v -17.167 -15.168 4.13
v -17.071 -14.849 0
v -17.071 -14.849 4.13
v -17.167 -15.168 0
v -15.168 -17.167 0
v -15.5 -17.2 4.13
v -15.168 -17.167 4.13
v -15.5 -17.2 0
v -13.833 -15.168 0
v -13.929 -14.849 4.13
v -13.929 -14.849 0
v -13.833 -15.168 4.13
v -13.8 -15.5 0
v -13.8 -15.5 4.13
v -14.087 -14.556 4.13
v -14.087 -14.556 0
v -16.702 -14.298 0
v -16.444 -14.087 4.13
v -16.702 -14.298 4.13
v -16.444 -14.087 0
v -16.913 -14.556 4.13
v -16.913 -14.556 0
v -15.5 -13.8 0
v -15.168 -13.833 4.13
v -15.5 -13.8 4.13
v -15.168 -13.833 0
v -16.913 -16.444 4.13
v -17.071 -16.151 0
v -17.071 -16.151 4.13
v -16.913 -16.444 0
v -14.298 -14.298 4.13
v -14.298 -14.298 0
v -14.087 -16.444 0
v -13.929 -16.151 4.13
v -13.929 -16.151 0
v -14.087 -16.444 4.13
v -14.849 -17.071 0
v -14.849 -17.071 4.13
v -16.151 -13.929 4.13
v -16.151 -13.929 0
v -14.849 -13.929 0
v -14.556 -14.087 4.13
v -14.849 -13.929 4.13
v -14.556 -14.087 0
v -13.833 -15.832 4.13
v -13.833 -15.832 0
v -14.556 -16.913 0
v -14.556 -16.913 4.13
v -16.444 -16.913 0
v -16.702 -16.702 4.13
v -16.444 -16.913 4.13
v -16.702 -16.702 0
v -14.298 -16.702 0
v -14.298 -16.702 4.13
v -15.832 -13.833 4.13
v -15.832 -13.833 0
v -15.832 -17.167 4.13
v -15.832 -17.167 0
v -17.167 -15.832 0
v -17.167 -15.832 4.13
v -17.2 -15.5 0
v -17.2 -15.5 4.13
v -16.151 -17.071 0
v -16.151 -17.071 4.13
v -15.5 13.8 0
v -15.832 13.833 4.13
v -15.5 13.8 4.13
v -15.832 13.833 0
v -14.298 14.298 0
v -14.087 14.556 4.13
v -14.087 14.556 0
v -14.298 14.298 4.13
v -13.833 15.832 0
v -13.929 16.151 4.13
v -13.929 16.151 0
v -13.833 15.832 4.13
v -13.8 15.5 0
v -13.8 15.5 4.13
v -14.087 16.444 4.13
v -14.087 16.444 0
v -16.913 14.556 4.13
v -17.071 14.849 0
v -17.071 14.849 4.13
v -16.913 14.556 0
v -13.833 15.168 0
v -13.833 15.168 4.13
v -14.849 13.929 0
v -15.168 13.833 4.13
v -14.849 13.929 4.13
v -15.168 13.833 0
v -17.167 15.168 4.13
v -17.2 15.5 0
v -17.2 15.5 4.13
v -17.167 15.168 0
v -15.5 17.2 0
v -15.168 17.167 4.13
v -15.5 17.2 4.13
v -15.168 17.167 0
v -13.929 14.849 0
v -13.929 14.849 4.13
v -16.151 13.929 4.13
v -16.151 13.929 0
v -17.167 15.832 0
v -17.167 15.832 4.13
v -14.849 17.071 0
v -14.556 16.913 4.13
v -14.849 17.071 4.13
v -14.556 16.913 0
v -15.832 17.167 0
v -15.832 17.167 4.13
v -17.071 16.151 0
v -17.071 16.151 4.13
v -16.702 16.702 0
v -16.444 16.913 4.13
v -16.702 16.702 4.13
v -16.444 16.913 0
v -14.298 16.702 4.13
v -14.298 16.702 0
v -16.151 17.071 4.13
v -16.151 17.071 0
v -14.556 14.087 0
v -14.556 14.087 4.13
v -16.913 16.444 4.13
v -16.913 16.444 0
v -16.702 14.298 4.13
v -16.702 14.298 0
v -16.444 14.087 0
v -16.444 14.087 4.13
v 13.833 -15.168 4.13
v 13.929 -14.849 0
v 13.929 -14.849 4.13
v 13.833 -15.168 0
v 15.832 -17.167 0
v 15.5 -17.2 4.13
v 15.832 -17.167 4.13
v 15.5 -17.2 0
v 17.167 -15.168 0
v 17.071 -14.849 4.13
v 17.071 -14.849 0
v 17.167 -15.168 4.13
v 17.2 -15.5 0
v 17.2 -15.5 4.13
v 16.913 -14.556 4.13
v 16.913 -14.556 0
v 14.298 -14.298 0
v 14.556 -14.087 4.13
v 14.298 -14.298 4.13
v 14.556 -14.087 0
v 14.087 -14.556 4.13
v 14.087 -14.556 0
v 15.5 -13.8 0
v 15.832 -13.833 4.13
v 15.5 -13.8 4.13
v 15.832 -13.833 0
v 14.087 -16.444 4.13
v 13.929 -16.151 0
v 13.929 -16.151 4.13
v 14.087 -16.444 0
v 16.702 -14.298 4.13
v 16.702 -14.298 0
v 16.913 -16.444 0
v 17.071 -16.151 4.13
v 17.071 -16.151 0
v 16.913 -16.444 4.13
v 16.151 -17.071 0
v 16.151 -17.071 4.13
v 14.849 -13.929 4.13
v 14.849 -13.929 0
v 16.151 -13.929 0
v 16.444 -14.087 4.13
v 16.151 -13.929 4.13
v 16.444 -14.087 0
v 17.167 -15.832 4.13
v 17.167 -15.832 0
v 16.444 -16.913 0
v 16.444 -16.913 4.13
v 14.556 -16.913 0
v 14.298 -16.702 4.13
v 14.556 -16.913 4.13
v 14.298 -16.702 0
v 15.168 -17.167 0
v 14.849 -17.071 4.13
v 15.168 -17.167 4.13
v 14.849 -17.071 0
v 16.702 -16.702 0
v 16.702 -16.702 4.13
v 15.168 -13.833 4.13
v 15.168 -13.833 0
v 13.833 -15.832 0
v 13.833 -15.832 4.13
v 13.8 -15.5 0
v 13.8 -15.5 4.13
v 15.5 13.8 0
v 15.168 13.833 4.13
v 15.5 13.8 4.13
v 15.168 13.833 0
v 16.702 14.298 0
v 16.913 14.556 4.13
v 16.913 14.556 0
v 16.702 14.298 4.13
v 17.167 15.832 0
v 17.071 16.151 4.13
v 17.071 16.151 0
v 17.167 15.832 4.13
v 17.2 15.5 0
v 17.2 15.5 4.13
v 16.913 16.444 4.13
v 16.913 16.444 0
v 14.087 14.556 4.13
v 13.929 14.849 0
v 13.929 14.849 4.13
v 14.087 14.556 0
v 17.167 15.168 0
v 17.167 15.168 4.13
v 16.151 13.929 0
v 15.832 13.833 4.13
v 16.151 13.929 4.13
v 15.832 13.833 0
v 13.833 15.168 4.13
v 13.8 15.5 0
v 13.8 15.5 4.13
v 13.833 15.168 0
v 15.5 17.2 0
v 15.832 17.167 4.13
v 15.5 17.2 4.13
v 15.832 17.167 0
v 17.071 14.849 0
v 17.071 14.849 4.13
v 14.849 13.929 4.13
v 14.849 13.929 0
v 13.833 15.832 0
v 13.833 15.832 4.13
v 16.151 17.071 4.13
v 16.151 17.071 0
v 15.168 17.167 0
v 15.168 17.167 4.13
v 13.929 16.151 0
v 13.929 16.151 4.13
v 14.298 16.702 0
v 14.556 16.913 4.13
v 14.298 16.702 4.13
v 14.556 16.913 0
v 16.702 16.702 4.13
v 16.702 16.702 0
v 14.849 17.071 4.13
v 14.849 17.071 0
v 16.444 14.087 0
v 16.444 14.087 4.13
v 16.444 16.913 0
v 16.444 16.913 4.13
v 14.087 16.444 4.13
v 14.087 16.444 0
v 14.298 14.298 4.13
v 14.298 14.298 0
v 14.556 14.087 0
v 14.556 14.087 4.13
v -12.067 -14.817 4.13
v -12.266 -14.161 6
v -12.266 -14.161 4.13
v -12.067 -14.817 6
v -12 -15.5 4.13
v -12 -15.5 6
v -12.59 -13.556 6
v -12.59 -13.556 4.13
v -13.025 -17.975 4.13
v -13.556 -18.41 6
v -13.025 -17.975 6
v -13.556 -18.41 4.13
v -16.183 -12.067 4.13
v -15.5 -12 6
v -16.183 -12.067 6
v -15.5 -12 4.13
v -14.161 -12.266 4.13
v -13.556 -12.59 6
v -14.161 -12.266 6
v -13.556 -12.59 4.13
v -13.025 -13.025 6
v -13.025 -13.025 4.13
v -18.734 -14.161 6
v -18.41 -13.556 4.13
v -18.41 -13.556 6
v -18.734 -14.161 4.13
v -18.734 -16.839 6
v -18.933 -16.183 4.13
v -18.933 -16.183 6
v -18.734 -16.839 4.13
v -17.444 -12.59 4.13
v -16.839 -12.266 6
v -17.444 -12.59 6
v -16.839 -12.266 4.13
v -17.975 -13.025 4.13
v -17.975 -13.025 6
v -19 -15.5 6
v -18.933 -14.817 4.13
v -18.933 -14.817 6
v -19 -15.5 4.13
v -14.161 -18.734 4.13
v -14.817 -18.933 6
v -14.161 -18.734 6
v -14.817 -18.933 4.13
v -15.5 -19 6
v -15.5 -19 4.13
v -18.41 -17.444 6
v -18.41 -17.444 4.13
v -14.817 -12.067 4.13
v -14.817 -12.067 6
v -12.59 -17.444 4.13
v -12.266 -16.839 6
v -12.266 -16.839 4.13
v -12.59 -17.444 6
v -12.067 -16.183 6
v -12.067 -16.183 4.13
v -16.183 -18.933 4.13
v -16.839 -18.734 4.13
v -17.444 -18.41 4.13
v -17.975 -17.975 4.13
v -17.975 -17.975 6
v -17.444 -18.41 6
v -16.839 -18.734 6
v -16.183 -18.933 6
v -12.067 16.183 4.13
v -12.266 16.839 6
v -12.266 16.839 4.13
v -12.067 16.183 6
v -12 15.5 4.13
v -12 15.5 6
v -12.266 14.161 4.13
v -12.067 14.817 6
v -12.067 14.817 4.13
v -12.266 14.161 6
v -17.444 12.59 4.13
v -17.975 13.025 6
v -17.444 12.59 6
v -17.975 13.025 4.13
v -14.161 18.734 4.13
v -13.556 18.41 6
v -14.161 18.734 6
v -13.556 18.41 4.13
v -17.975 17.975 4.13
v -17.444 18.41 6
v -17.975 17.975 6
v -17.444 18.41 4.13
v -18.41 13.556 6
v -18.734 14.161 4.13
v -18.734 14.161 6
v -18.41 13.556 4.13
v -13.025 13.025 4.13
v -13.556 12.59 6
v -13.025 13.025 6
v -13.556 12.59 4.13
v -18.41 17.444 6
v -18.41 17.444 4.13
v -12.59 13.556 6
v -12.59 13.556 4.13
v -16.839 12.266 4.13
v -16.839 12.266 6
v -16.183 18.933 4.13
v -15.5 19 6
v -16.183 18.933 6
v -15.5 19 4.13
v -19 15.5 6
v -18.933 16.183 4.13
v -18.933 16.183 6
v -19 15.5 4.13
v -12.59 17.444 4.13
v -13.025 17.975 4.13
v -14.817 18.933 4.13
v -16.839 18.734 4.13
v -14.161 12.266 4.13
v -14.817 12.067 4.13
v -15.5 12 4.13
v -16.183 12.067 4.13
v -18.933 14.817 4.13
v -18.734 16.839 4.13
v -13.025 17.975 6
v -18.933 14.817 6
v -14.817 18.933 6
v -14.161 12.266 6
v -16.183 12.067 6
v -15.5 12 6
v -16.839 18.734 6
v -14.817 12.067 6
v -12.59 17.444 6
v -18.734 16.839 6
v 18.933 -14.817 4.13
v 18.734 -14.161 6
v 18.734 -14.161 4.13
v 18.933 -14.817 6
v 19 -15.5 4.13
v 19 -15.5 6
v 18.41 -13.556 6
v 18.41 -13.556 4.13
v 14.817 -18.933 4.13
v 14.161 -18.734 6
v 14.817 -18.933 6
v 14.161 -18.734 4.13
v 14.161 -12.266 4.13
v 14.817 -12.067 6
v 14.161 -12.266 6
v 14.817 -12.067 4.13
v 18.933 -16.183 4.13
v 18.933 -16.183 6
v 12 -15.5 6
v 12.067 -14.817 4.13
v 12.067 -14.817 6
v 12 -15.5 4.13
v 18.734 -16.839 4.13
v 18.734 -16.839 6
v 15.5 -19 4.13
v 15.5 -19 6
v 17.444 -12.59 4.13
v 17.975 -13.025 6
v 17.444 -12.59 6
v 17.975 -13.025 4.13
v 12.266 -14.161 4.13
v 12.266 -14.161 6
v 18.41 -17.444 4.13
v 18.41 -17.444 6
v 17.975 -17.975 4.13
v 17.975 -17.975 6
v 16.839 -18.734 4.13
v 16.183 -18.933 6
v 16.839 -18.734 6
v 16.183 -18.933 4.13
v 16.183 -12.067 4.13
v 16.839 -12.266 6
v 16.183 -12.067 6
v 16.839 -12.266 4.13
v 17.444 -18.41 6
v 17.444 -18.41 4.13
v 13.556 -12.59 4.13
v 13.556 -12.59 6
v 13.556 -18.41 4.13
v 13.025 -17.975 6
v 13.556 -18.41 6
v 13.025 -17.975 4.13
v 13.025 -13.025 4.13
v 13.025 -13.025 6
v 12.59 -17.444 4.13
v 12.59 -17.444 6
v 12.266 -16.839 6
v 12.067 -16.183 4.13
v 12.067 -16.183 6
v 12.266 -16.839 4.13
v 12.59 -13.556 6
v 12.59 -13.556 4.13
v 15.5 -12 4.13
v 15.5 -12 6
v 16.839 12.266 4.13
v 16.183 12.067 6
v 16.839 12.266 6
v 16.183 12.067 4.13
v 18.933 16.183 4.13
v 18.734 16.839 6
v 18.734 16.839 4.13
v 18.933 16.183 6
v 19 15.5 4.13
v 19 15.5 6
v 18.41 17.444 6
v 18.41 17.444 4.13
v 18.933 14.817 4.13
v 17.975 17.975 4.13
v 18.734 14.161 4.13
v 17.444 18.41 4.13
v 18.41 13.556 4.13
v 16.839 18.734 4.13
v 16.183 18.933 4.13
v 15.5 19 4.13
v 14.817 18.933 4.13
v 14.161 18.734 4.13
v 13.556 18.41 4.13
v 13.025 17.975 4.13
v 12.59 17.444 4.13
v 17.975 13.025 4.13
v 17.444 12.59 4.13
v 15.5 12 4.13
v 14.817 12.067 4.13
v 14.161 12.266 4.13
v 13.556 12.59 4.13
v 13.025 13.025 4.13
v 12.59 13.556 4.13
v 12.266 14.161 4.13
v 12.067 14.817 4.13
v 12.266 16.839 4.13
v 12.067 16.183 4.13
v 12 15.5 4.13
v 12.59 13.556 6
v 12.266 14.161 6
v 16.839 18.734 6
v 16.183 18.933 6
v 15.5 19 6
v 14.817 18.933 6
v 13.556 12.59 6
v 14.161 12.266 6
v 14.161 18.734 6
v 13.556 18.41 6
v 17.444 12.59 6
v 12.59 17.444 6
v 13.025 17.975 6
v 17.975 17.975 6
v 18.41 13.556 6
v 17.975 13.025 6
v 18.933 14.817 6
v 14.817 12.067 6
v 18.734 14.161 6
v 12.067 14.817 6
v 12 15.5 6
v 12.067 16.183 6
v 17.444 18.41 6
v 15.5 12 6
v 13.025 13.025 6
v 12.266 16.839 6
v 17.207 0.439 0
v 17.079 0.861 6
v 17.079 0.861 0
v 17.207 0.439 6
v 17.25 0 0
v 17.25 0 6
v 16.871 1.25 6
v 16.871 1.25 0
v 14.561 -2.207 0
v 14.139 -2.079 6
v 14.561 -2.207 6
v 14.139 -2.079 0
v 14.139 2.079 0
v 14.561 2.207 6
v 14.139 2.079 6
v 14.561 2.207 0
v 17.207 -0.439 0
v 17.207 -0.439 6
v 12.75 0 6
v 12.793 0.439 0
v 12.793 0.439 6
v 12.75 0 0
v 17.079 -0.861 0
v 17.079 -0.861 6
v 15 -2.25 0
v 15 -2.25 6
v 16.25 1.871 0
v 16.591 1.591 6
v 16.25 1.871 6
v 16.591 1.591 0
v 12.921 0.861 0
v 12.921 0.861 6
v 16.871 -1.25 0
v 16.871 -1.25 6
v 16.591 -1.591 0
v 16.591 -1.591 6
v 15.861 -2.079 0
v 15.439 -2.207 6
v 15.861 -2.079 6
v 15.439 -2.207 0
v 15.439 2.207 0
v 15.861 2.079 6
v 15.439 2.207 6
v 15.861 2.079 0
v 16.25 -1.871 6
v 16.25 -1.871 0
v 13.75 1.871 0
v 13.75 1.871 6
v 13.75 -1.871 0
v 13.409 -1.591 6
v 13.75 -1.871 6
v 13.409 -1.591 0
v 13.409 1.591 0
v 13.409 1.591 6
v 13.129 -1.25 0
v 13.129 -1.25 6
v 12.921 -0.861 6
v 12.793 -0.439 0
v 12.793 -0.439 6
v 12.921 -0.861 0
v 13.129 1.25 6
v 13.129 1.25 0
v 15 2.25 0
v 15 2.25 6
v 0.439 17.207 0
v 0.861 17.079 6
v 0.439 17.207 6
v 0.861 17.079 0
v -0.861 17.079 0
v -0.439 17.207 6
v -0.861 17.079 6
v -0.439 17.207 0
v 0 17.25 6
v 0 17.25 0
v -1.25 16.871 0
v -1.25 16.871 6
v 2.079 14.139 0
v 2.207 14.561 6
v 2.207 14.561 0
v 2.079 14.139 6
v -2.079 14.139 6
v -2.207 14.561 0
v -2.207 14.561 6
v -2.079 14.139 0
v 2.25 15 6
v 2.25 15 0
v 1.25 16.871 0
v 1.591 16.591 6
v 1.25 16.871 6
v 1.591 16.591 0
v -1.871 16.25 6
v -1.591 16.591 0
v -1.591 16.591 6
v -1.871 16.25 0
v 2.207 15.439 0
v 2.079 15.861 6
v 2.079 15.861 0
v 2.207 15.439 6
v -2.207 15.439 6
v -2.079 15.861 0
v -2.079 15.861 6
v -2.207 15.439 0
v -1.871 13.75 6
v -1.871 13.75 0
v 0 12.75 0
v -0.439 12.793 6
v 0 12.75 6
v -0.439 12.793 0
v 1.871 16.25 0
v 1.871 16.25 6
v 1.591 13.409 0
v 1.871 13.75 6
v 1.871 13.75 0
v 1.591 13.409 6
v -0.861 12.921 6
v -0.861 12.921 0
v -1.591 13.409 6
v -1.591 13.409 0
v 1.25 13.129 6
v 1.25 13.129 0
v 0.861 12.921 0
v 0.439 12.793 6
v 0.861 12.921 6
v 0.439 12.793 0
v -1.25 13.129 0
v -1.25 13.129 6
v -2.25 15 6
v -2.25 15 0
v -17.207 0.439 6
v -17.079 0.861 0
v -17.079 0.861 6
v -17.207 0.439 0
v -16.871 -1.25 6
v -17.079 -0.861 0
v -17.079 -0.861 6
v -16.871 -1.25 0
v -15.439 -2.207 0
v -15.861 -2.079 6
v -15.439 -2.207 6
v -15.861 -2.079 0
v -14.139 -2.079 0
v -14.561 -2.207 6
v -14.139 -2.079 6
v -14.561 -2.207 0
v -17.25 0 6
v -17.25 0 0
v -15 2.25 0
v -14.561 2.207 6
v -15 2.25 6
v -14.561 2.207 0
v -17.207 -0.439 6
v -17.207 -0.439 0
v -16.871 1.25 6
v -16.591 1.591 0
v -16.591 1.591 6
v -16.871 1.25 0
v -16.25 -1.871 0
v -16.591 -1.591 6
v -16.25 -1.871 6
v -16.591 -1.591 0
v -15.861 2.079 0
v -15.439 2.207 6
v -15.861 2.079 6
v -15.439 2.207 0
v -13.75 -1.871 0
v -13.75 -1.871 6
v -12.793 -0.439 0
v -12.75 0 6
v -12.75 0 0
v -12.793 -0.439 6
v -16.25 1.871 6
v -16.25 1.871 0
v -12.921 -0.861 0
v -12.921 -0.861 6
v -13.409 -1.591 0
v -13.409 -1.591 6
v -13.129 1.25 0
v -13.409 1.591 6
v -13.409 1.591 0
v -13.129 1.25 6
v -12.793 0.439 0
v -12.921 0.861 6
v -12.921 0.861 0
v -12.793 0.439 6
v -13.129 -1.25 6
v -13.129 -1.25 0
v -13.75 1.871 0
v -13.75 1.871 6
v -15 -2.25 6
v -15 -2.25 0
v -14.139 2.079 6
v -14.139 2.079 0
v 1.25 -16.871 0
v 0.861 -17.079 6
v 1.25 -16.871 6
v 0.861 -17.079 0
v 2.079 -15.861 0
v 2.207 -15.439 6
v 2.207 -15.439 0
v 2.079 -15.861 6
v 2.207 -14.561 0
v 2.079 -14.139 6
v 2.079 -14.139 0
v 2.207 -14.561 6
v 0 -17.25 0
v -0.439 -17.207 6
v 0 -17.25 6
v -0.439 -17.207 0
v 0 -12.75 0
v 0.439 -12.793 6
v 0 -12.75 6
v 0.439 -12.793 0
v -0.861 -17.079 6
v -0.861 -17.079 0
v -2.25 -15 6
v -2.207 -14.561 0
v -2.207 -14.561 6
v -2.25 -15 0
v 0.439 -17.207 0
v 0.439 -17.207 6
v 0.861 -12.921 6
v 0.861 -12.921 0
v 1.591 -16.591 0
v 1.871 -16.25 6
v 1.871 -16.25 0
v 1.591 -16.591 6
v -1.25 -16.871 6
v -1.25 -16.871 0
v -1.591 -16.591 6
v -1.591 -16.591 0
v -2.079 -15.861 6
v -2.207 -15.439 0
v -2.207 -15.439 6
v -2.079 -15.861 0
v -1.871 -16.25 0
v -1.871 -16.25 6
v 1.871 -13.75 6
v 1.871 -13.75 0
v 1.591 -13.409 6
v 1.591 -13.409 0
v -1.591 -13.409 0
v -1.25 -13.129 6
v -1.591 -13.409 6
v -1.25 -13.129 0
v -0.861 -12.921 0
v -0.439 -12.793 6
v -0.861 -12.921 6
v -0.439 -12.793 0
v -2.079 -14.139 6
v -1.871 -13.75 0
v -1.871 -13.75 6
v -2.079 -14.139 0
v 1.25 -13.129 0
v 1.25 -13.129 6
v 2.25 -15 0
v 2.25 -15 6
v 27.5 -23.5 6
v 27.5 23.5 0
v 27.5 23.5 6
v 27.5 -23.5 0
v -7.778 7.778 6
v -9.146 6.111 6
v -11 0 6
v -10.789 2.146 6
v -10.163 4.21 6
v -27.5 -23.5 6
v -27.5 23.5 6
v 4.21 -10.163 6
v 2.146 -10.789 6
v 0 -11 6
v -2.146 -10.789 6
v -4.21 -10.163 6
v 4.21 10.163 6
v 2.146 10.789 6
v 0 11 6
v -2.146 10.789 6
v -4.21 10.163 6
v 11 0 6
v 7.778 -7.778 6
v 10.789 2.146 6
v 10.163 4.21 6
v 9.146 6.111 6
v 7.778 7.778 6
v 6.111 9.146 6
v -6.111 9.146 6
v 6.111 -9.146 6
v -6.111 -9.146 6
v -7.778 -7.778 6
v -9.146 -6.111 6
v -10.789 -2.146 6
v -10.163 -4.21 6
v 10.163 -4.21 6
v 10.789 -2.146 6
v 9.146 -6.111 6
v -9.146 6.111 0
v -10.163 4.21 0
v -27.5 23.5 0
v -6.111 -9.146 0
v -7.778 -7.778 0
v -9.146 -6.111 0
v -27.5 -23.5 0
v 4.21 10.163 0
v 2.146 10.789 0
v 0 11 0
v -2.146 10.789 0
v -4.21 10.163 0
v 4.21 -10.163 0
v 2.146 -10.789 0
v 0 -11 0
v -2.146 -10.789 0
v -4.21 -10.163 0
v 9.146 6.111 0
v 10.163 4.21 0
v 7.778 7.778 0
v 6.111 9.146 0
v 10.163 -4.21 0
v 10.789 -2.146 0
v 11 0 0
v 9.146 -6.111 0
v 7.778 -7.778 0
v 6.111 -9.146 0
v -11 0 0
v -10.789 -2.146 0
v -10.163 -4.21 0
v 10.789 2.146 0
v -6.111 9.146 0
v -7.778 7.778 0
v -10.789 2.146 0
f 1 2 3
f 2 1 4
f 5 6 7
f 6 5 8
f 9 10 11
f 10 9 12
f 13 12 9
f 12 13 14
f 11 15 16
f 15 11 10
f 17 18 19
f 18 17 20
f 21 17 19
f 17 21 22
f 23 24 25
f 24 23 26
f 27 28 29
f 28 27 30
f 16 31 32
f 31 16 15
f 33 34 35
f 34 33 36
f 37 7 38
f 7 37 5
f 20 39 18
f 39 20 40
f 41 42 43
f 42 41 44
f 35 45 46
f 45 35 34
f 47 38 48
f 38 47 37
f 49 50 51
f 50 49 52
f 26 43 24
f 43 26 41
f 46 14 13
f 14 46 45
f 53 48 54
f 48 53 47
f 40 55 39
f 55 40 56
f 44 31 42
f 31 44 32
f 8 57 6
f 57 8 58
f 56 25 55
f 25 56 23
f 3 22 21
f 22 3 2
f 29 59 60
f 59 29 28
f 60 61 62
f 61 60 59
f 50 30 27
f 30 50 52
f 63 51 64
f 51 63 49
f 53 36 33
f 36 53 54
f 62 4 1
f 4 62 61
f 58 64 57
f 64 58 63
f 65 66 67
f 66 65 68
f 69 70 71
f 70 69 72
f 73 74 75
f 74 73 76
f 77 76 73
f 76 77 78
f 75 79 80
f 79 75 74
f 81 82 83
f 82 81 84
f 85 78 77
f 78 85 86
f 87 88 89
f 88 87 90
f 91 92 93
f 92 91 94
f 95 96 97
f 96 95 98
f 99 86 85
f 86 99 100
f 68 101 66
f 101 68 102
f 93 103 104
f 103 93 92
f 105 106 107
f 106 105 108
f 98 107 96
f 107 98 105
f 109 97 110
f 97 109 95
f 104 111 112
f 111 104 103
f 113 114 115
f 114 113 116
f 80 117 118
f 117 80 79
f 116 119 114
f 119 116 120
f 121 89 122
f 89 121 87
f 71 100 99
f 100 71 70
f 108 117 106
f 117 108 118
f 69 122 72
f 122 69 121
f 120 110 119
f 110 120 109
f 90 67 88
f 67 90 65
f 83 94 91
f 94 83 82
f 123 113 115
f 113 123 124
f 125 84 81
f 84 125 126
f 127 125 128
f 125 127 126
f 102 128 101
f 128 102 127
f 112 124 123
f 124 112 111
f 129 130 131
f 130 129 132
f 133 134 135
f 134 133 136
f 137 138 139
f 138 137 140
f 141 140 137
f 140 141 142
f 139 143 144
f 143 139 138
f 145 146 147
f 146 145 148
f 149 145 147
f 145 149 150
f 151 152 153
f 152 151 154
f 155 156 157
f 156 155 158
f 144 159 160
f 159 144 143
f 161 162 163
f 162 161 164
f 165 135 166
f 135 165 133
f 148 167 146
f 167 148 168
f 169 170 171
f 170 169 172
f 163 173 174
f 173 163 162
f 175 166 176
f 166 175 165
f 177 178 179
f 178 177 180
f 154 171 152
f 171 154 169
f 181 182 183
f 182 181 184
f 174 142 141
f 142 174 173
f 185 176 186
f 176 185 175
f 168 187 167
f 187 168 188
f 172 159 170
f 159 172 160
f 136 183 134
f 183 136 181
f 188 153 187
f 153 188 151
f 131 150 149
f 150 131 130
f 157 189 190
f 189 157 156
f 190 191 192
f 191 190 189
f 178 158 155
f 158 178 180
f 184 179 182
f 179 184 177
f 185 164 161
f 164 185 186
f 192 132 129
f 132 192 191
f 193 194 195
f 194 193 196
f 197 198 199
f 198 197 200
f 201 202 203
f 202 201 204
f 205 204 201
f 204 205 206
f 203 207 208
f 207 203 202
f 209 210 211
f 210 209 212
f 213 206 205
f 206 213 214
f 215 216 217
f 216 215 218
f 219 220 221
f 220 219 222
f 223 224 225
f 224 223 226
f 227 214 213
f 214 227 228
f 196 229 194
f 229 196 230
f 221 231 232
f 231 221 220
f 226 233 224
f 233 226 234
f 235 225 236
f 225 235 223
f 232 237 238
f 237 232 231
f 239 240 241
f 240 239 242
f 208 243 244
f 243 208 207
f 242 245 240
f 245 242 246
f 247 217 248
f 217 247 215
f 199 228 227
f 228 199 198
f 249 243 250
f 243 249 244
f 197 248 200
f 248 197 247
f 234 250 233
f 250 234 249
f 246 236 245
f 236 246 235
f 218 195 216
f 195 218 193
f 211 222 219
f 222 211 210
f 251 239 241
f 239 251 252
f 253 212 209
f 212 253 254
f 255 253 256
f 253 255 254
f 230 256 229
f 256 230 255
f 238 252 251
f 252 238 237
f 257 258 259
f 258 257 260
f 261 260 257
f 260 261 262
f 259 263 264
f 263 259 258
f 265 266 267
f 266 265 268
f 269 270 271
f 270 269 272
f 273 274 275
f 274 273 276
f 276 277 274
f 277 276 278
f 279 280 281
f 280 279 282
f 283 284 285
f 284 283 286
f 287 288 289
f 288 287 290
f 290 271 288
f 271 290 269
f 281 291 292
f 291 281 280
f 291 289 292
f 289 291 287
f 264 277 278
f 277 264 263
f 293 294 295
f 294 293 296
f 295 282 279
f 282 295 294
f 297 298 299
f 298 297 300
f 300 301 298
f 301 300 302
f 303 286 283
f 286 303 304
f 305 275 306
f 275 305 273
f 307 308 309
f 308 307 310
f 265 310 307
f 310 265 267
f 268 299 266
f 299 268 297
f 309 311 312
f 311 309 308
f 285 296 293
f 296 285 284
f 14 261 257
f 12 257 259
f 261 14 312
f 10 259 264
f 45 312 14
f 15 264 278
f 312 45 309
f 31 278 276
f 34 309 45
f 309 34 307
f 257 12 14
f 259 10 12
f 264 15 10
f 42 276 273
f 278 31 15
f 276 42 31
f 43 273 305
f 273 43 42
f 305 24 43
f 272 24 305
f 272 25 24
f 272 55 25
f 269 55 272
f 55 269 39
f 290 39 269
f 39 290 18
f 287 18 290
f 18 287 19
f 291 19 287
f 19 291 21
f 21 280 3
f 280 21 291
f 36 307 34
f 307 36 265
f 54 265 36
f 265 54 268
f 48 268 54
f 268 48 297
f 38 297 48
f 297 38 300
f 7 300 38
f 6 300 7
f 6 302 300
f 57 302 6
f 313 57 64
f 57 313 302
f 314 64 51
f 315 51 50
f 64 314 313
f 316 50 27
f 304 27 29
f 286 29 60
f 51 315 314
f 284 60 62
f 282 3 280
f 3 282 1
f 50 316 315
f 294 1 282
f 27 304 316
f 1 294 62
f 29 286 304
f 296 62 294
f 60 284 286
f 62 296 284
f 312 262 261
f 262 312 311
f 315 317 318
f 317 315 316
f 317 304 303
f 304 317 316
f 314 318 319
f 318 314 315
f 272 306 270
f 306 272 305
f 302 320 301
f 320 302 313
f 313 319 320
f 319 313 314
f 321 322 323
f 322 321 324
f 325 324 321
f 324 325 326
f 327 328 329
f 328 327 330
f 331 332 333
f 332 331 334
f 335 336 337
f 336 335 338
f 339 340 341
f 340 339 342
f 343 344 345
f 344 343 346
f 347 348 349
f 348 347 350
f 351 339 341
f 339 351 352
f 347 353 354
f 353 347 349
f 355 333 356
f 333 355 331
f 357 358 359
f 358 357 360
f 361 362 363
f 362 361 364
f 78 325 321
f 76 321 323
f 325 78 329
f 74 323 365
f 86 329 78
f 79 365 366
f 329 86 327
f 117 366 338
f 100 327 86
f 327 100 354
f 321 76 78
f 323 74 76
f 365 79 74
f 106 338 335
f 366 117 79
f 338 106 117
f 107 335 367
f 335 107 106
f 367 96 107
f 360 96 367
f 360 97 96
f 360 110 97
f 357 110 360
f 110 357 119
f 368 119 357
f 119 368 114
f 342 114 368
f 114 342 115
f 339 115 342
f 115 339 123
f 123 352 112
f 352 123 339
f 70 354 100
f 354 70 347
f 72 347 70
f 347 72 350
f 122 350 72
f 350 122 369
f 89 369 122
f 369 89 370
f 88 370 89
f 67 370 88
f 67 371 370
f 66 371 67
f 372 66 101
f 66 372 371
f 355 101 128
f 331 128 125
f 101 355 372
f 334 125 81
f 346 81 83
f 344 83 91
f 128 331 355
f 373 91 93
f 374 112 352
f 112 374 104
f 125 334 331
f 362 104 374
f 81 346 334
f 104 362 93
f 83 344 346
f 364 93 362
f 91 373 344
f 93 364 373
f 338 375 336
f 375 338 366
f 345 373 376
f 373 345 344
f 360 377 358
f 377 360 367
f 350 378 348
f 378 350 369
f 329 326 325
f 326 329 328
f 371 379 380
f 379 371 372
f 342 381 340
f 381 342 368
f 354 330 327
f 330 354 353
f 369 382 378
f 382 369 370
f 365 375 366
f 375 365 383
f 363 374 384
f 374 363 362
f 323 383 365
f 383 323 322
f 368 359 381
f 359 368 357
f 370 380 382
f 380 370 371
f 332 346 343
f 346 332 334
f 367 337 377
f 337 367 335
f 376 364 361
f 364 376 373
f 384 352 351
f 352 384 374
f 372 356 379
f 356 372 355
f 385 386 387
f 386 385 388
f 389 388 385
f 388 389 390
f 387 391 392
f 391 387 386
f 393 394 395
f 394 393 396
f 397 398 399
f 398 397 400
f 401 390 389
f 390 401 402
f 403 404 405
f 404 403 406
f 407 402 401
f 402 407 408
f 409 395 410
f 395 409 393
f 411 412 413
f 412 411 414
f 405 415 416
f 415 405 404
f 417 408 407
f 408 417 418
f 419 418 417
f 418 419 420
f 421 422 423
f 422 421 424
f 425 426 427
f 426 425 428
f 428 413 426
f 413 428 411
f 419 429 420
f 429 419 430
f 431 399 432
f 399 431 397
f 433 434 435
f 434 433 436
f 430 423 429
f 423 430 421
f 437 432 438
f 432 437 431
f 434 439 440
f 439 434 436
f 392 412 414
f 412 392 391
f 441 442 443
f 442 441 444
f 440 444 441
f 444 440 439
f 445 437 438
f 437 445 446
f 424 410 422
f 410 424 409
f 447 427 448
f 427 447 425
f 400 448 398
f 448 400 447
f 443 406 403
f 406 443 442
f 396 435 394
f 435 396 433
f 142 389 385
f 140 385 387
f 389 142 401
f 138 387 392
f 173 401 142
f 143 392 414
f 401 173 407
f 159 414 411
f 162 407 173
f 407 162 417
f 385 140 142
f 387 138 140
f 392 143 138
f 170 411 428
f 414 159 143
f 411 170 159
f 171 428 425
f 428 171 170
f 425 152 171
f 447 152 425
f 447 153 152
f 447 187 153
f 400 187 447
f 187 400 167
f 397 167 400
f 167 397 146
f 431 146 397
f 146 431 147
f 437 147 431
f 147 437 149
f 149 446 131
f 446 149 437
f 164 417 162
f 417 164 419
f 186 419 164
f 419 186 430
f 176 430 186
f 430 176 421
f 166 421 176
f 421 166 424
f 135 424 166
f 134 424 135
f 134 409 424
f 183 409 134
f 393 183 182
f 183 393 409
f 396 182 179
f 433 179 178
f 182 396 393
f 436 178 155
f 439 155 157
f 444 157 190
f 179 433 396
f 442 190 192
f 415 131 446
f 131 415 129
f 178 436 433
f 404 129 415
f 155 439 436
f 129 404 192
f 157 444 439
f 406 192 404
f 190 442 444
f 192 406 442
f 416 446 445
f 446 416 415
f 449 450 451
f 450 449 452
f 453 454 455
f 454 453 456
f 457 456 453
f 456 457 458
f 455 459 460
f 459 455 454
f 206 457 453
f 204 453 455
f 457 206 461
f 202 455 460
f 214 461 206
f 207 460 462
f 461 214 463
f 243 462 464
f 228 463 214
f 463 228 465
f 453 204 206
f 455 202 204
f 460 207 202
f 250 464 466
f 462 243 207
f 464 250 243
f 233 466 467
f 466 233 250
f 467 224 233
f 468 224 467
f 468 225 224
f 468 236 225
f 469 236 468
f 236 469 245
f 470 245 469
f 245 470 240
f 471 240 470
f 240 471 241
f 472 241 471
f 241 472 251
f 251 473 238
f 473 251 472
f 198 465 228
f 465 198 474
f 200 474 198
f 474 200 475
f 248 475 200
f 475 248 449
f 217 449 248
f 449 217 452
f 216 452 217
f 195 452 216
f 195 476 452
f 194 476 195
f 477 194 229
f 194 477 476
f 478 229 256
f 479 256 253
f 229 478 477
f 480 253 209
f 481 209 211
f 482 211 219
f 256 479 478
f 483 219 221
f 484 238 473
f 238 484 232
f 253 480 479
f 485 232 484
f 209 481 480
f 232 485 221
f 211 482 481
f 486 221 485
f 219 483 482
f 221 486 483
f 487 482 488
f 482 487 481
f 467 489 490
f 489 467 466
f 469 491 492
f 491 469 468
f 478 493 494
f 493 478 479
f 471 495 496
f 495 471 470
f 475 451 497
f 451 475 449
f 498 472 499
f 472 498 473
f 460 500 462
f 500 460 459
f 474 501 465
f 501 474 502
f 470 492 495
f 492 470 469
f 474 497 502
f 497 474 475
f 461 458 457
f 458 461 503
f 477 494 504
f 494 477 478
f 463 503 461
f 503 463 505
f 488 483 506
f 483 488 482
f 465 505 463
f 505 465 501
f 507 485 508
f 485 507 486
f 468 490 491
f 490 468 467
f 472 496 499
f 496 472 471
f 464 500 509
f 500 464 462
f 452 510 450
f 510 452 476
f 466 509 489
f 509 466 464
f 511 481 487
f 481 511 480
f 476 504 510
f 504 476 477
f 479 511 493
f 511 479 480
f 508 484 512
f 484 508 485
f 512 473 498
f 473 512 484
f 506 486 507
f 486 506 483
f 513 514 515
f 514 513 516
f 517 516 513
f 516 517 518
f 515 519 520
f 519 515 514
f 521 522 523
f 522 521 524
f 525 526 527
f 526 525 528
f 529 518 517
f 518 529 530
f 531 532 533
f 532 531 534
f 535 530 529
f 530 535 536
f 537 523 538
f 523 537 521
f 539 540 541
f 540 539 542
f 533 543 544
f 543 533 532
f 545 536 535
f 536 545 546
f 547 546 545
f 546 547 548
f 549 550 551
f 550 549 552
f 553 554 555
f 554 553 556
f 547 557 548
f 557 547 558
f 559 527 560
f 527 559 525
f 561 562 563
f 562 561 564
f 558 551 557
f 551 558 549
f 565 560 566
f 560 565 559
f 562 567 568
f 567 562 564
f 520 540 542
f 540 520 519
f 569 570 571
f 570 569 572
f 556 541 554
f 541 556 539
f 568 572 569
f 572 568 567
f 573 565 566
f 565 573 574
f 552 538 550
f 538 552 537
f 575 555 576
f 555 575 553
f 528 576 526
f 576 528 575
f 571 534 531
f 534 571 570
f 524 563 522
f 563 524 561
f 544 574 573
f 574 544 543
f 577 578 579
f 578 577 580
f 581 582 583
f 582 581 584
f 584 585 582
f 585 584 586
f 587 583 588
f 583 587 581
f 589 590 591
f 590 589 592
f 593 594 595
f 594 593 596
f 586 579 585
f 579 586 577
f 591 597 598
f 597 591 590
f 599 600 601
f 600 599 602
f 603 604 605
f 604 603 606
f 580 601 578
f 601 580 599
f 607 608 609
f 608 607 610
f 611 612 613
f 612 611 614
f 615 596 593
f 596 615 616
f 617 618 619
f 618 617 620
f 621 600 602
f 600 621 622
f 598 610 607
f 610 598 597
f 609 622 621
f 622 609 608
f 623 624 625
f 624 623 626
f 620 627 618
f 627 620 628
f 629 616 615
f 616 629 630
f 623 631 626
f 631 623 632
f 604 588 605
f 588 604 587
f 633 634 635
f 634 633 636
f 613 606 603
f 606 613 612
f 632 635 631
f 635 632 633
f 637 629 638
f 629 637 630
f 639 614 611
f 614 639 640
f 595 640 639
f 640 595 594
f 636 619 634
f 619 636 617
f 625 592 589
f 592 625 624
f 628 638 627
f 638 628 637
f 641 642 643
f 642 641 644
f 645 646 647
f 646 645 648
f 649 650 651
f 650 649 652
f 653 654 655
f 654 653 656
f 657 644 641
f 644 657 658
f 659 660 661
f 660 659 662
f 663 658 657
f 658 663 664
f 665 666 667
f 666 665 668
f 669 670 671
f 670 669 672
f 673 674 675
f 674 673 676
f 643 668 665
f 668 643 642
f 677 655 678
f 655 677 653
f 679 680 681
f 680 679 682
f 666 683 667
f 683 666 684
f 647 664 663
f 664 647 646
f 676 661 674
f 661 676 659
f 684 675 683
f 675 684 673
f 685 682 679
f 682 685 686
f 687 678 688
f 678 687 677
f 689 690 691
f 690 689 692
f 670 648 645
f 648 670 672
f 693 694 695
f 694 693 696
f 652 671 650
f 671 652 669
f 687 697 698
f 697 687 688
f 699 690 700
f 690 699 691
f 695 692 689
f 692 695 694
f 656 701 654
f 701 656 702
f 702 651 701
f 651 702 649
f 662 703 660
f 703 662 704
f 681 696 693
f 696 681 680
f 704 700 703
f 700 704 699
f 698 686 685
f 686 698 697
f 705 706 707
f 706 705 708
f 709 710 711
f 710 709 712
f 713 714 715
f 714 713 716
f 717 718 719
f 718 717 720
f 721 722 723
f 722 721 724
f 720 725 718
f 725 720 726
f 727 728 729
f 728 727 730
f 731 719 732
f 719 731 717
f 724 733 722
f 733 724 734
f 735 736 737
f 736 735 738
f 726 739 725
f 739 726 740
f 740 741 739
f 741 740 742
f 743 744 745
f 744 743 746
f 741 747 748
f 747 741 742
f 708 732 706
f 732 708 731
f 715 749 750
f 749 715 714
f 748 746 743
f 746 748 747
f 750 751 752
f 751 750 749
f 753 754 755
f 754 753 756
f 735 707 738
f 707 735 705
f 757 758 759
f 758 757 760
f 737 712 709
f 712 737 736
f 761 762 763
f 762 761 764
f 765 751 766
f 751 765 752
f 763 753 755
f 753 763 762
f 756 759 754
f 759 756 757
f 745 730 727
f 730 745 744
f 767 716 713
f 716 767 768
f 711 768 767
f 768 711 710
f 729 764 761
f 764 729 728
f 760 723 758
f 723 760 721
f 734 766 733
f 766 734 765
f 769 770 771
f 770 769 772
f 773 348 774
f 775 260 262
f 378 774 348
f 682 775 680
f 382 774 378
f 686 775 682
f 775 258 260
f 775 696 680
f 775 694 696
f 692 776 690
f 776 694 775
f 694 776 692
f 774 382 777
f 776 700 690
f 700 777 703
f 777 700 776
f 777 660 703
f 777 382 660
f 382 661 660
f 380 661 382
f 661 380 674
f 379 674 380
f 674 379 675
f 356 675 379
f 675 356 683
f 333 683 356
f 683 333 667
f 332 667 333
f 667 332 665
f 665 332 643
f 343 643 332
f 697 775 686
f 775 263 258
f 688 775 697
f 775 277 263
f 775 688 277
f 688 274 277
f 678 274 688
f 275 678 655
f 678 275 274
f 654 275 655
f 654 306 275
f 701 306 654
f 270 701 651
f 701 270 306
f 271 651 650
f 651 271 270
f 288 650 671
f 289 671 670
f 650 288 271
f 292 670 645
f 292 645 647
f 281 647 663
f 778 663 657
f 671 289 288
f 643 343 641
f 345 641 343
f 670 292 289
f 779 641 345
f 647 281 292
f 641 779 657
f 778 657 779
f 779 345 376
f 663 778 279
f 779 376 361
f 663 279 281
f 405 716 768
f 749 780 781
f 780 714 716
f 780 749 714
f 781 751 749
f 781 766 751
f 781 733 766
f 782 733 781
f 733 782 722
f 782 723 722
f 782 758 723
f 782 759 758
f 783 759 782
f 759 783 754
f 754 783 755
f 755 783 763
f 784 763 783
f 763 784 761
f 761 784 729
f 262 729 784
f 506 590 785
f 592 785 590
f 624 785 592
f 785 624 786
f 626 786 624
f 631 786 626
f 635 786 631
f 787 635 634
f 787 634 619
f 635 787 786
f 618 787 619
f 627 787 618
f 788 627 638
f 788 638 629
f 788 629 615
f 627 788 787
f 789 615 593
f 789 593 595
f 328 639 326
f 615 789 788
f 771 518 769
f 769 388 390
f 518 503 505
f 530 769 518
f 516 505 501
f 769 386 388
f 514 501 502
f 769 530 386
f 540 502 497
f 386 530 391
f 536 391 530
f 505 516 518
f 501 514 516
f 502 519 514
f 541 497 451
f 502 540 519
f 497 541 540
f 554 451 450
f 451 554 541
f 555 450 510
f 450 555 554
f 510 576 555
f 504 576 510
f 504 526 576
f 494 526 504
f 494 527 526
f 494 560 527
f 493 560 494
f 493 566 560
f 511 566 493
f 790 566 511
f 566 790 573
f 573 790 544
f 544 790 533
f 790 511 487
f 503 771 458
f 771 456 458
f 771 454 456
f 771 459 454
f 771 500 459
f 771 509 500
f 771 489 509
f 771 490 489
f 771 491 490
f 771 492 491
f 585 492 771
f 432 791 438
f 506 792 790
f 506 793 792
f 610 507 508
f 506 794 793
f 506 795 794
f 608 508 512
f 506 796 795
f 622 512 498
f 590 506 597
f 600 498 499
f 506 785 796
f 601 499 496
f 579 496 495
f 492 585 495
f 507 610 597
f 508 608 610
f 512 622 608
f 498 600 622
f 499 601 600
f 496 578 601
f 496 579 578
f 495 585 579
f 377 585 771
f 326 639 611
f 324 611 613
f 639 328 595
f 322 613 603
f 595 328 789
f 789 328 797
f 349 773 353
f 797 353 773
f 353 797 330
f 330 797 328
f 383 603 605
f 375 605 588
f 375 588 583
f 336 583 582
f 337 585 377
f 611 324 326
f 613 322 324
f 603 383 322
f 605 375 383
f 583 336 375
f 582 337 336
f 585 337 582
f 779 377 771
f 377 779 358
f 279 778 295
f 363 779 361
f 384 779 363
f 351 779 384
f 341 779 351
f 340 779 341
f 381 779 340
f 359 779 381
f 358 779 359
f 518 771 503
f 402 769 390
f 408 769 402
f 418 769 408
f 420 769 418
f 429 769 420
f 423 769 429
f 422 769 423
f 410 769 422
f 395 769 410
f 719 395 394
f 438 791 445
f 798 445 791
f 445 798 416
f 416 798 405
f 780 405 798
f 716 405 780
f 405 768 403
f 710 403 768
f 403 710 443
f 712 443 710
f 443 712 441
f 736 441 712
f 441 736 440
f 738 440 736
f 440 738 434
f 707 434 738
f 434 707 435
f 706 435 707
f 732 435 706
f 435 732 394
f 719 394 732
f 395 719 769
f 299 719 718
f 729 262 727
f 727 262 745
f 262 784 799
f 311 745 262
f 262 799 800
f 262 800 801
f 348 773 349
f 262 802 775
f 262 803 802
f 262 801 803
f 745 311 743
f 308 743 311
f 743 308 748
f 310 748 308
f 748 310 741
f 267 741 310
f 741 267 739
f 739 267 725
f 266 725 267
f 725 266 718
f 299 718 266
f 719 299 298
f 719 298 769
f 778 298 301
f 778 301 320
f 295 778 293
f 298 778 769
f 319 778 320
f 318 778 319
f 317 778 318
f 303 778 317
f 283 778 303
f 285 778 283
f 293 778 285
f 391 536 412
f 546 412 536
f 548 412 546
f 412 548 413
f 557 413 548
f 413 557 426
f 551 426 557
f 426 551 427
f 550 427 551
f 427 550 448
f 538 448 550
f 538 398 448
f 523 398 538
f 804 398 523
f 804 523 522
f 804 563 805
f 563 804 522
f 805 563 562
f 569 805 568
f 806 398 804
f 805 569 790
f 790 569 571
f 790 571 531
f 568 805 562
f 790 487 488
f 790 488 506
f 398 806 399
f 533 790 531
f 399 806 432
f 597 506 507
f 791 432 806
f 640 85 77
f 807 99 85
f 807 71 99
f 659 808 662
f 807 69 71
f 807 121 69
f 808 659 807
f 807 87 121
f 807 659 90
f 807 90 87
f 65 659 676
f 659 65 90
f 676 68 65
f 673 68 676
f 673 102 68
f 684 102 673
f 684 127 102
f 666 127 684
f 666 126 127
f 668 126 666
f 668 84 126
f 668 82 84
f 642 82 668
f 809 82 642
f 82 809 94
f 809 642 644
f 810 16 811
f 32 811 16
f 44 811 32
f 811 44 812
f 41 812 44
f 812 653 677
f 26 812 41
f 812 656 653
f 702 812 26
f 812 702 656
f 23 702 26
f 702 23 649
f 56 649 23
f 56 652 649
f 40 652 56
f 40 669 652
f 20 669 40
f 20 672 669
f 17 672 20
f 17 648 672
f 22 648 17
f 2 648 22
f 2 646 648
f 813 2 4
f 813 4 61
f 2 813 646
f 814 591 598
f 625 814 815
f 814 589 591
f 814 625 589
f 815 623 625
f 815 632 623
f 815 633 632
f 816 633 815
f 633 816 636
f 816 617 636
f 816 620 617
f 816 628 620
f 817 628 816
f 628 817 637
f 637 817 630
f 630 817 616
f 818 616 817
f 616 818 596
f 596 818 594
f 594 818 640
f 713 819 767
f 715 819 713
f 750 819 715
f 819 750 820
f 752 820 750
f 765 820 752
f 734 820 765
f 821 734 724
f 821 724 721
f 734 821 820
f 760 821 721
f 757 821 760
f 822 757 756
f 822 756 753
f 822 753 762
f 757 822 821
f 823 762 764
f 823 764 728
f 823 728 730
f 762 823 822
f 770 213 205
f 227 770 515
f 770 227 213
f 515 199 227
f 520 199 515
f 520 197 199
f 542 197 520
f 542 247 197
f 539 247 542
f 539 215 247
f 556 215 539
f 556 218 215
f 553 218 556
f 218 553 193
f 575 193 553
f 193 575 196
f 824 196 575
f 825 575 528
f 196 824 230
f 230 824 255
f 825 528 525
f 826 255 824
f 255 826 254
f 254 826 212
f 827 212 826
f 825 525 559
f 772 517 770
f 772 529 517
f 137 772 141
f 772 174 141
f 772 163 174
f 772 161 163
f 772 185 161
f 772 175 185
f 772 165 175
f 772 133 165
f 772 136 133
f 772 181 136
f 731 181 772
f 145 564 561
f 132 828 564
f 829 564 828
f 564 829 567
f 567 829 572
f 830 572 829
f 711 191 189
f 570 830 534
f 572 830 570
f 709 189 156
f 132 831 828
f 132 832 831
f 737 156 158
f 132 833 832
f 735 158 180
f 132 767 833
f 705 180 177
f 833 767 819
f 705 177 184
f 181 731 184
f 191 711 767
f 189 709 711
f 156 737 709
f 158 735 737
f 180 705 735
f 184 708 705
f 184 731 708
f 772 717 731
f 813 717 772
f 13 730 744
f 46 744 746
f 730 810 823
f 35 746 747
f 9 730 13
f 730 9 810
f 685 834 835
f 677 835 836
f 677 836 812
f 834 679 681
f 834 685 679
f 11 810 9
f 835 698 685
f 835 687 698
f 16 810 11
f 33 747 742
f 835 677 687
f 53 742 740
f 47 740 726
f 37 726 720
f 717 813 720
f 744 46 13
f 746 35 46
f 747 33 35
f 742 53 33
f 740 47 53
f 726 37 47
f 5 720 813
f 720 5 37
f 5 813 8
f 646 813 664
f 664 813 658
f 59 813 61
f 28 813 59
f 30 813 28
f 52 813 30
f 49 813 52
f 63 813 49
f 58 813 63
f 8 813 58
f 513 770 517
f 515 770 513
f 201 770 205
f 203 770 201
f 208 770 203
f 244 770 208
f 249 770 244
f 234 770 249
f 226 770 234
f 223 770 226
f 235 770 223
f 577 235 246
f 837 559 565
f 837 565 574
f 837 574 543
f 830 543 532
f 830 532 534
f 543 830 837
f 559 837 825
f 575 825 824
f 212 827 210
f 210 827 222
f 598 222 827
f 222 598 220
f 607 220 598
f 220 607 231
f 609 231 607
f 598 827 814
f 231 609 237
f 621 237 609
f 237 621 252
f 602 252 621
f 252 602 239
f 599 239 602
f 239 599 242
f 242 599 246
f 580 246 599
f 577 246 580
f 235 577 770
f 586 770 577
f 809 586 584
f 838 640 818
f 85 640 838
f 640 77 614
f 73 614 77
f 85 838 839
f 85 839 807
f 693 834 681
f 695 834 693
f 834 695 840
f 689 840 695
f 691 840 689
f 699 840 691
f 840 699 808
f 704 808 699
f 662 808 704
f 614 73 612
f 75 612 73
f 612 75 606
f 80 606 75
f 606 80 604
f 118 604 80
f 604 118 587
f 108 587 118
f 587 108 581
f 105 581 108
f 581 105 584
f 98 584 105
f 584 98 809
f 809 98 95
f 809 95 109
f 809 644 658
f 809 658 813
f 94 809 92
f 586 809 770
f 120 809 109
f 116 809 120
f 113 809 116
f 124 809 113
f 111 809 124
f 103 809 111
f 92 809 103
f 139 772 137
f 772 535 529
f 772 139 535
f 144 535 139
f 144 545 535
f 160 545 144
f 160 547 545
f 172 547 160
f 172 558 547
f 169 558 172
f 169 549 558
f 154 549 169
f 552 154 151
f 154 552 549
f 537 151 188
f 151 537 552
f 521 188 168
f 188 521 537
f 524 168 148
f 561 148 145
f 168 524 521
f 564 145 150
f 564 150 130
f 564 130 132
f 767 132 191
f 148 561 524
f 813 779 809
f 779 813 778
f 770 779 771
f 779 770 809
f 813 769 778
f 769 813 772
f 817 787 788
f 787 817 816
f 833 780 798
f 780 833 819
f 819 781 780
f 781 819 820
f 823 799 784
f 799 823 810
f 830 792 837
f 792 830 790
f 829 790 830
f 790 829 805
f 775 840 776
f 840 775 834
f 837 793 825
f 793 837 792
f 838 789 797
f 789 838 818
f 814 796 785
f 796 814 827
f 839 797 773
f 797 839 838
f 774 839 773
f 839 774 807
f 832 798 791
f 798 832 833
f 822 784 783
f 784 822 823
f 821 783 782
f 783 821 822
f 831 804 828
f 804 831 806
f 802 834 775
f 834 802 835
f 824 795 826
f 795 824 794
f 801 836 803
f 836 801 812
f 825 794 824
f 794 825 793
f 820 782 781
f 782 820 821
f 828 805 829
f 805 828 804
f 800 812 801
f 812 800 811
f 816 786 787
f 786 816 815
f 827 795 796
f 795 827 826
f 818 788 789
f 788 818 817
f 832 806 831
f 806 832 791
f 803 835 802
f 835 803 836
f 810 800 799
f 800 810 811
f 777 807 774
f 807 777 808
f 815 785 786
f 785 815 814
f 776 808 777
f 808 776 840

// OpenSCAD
$fn = 32;

// ----------------------------------------------------------------------
// Motor mount plate: NEMA17, 55 x 47 x 6 mm
// ----------------------------------------------------------------------

// --- parameters (mm) ---
plate_w = 55;             // plate length, X
plate_d = 47;             // plate width, Y
plate_t = 6;              // plate thickness
pattern = 31;             // NEMA17 bolt spacing
motor_d = 3.4;            // NEMA17 screw clearance
pilot_d = 22;             // pilot boss bore
cb_d = 7;                 // counterbore seat
cb_h = 1.87;              // counterbore depth
second_d = 4.5;           // second fastener hole
bc_r = 15;                // second bolt circle radius
bc_n = 4;                 // second bolt circle count

module plate() {
  translate([-plate_w / 2, -plate_d / 2, 0]) cube([plate_w, plate_d, plate_t]);
}

module motor_holes() {
  for (sx = [-1, 1]) for (sy = [-1, 1])
    translate([sx * pattern / 2, sy * pattern / 2, -1])
      cylinder(h = plate_t + 2, d = motor_d);
}
module motor_counterbores() {
  for (sx = [-1, 1]) for (sy = [-1, 1])
    translate([sx * pattern / 2, sy * pattern / 2, plate_t - cb_h])
      cylinder(h = cb_h + 0.6, d = cb_d);
}

difference() {
  union() {
    plate();
  }
  motor_holes();
  translate([0, 0, -1]) cylinder(h = plate_t + 2, d = pilot_d);
  motor_counterbores();
  for (i = [0 : bc_n - 1]) rotate([0, 0, i * 360 / bc_n]) translate([bc_r, 0, -1])    cylinder(h = plate_t + 2, d = second_d);
}
